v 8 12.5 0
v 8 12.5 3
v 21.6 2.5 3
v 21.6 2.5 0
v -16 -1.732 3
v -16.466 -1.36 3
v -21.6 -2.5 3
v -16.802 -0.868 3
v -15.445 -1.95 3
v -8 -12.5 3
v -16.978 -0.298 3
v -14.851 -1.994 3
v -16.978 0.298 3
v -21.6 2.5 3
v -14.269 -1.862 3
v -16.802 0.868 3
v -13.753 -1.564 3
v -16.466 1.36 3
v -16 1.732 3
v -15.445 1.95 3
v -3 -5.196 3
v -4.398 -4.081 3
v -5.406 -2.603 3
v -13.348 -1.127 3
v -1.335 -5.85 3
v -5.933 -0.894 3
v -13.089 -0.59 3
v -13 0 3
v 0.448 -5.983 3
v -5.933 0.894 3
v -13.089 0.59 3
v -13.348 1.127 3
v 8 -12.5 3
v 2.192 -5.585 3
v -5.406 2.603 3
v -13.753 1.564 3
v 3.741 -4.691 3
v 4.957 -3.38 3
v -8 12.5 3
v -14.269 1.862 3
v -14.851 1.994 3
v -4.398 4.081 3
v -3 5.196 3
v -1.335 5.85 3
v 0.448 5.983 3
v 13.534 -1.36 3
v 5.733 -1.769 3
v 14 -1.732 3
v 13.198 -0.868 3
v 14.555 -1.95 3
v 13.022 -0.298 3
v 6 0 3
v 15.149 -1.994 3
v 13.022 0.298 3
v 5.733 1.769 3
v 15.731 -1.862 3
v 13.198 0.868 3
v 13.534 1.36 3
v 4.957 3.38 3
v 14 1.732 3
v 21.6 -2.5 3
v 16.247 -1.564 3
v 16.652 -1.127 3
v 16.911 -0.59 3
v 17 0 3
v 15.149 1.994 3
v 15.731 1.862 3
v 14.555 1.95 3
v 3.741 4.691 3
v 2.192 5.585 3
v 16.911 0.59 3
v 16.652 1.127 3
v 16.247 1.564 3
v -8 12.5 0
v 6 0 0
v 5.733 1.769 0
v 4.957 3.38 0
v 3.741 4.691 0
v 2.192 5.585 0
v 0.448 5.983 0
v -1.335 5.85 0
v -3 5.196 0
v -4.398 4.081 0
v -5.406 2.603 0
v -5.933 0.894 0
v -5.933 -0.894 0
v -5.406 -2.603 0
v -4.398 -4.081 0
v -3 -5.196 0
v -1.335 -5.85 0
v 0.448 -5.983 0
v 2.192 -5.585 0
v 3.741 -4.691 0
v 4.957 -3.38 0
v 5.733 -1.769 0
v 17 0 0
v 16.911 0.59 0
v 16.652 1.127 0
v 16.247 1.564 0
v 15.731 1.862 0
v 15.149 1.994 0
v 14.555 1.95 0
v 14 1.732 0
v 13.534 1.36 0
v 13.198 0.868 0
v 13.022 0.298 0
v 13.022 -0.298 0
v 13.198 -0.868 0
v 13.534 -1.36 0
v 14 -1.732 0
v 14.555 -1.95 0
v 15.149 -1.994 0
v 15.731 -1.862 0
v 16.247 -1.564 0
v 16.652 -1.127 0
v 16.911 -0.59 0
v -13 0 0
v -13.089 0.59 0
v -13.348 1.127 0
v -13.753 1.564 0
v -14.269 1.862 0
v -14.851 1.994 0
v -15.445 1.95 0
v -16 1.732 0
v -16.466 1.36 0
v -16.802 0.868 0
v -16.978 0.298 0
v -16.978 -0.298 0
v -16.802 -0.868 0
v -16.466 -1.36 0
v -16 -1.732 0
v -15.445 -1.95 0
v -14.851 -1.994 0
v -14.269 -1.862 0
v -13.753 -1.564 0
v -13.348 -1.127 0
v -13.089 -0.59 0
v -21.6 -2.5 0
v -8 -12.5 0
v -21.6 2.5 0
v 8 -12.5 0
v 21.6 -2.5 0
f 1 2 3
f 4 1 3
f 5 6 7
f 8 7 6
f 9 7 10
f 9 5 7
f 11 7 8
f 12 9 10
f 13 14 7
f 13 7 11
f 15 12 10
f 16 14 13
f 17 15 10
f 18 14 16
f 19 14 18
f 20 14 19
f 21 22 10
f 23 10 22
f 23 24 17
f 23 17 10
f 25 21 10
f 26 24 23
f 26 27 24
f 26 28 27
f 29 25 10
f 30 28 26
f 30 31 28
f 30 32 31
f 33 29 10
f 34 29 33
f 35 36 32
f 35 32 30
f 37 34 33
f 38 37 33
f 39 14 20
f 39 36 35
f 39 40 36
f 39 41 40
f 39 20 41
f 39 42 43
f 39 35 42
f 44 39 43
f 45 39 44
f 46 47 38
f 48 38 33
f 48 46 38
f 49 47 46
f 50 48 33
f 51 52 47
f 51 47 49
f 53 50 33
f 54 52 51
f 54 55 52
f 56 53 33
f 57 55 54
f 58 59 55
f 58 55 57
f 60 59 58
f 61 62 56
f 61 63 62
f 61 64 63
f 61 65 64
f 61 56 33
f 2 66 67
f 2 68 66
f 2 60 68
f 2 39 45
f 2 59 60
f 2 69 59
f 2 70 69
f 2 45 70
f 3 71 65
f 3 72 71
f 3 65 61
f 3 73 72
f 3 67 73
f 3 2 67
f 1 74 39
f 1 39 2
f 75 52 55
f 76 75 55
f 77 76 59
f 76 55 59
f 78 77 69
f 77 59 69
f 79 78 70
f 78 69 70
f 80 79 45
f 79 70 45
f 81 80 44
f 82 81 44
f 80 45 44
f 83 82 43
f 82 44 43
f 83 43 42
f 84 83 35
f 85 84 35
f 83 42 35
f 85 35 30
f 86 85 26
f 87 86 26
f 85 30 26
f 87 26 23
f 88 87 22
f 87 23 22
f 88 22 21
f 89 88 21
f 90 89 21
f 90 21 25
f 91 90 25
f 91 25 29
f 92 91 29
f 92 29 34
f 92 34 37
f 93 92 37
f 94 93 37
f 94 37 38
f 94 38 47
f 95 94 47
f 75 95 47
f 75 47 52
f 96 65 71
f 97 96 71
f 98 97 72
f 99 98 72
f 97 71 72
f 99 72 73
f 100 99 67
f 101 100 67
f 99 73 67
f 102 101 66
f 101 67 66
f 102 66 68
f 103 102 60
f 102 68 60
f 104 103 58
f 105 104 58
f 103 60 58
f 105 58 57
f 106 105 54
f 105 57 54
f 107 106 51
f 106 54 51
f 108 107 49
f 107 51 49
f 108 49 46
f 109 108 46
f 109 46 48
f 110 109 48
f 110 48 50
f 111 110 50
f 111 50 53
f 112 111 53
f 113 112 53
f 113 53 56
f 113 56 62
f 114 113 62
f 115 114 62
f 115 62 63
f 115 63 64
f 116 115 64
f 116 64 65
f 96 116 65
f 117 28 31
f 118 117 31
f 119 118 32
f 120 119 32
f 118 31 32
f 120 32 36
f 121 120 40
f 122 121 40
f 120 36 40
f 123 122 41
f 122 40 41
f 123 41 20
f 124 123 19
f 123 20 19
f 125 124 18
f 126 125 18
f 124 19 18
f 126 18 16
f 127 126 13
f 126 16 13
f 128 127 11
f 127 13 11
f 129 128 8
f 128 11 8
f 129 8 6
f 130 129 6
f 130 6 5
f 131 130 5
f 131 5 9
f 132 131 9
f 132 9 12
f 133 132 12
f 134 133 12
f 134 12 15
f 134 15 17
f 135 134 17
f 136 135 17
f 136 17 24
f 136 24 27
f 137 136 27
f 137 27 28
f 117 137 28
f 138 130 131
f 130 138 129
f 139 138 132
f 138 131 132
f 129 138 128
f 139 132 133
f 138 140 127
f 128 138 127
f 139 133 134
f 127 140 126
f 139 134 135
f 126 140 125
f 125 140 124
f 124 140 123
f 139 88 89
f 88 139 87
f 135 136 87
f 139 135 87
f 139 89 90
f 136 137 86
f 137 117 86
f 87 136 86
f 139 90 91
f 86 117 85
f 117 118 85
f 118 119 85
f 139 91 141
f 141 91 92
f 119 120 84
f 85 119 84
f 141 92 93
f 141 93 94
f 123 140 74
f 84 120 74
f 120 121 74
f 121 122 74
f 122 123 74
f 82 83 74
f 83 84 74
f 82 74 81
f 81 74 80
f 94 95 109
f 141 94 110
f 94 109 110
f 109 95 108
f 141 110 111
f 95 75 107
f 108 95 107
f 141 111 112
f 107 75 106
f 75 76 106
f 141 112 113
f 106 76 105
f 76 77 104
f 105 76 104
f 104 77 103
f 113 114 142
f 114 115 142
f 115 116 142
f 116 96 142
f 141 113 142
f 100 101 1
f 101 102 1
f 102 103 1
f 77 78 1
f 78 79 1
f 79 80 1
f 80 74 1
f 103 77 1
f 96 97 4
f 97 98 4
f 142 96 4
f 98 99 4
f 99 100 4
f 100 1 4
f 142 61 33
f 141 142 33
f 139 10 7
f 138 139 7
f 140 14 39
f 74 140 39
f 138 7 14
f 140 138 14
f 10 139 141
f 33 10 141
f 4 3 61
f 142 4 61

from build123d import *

# Parameters (mm, degrees)
F0_W     = 50
F0_H     = 25
F1_DEPTH = 3
F2_R     = 6
F3_DEPTH = 3.001
F5_DEPTH = 3.001
F6_R     = 2
F7_DEPTH = 3.001
F9_DEPTH = 3.001


with BuildPart() as f1:
    # F0 (on Top) → F1 (new body)
    with BuildSketch(Plane.XY):
        Rectangle(F0_W, F0_H)
    extrude(amount=F1_DEPTH)

    # F2 (on face) → F3 (cut, through all)
    with BuildSketch(Plane.XY.offset(3)):
        Circle(F2_R)
    extrude(amount=-F3_DEPTH, mode=Mode.SUBTRACT)

    # F4 (on face) → F5 (cut, through all)
    with BuildSketch(Plane.XY.offset(3)):
        Polygon((-25, 12.5), (-25, 0), (-8, 12.5), align=None)
        Polygon((-8, -12.5), (-25, 0), (-25, -12.5), align=None)
        Polygon((25, 12.5), (8, 12.5), (25, 0), align=None)
        Polygon((25, 0), (8, -12.5), (25, -12.5), align=None)
    extrude(amount=-F5_DEPTH, mode=Mode.SUBTRACT)

    # F6 (on face) → F7 (cut, through all)
    with BuildSketch(Plane.XY.offset(3)):
        with Locations((-15, 0)):
            Circle(F6_R)
        with Locations((15, 0)):
            Circle(F6_R)
    extrude(amount=-F7_DEPTH, mode=Mode.SUBTRACT)

    # F8 (on face) → F9 (cut, through all)
    with BuildSketch(Plane.XY.offset(3)):
        Polygon((-21.6, -2.5), (-21.6, 2.5), (-25, 0), align=None)
        Polygon((25, 0), (21.6, 2.5), (21.6, -2.5), align=None)
    extrude(amount=-F9_DEPTH, mode=Mode.SUBTRACT)


solid = f1.part
